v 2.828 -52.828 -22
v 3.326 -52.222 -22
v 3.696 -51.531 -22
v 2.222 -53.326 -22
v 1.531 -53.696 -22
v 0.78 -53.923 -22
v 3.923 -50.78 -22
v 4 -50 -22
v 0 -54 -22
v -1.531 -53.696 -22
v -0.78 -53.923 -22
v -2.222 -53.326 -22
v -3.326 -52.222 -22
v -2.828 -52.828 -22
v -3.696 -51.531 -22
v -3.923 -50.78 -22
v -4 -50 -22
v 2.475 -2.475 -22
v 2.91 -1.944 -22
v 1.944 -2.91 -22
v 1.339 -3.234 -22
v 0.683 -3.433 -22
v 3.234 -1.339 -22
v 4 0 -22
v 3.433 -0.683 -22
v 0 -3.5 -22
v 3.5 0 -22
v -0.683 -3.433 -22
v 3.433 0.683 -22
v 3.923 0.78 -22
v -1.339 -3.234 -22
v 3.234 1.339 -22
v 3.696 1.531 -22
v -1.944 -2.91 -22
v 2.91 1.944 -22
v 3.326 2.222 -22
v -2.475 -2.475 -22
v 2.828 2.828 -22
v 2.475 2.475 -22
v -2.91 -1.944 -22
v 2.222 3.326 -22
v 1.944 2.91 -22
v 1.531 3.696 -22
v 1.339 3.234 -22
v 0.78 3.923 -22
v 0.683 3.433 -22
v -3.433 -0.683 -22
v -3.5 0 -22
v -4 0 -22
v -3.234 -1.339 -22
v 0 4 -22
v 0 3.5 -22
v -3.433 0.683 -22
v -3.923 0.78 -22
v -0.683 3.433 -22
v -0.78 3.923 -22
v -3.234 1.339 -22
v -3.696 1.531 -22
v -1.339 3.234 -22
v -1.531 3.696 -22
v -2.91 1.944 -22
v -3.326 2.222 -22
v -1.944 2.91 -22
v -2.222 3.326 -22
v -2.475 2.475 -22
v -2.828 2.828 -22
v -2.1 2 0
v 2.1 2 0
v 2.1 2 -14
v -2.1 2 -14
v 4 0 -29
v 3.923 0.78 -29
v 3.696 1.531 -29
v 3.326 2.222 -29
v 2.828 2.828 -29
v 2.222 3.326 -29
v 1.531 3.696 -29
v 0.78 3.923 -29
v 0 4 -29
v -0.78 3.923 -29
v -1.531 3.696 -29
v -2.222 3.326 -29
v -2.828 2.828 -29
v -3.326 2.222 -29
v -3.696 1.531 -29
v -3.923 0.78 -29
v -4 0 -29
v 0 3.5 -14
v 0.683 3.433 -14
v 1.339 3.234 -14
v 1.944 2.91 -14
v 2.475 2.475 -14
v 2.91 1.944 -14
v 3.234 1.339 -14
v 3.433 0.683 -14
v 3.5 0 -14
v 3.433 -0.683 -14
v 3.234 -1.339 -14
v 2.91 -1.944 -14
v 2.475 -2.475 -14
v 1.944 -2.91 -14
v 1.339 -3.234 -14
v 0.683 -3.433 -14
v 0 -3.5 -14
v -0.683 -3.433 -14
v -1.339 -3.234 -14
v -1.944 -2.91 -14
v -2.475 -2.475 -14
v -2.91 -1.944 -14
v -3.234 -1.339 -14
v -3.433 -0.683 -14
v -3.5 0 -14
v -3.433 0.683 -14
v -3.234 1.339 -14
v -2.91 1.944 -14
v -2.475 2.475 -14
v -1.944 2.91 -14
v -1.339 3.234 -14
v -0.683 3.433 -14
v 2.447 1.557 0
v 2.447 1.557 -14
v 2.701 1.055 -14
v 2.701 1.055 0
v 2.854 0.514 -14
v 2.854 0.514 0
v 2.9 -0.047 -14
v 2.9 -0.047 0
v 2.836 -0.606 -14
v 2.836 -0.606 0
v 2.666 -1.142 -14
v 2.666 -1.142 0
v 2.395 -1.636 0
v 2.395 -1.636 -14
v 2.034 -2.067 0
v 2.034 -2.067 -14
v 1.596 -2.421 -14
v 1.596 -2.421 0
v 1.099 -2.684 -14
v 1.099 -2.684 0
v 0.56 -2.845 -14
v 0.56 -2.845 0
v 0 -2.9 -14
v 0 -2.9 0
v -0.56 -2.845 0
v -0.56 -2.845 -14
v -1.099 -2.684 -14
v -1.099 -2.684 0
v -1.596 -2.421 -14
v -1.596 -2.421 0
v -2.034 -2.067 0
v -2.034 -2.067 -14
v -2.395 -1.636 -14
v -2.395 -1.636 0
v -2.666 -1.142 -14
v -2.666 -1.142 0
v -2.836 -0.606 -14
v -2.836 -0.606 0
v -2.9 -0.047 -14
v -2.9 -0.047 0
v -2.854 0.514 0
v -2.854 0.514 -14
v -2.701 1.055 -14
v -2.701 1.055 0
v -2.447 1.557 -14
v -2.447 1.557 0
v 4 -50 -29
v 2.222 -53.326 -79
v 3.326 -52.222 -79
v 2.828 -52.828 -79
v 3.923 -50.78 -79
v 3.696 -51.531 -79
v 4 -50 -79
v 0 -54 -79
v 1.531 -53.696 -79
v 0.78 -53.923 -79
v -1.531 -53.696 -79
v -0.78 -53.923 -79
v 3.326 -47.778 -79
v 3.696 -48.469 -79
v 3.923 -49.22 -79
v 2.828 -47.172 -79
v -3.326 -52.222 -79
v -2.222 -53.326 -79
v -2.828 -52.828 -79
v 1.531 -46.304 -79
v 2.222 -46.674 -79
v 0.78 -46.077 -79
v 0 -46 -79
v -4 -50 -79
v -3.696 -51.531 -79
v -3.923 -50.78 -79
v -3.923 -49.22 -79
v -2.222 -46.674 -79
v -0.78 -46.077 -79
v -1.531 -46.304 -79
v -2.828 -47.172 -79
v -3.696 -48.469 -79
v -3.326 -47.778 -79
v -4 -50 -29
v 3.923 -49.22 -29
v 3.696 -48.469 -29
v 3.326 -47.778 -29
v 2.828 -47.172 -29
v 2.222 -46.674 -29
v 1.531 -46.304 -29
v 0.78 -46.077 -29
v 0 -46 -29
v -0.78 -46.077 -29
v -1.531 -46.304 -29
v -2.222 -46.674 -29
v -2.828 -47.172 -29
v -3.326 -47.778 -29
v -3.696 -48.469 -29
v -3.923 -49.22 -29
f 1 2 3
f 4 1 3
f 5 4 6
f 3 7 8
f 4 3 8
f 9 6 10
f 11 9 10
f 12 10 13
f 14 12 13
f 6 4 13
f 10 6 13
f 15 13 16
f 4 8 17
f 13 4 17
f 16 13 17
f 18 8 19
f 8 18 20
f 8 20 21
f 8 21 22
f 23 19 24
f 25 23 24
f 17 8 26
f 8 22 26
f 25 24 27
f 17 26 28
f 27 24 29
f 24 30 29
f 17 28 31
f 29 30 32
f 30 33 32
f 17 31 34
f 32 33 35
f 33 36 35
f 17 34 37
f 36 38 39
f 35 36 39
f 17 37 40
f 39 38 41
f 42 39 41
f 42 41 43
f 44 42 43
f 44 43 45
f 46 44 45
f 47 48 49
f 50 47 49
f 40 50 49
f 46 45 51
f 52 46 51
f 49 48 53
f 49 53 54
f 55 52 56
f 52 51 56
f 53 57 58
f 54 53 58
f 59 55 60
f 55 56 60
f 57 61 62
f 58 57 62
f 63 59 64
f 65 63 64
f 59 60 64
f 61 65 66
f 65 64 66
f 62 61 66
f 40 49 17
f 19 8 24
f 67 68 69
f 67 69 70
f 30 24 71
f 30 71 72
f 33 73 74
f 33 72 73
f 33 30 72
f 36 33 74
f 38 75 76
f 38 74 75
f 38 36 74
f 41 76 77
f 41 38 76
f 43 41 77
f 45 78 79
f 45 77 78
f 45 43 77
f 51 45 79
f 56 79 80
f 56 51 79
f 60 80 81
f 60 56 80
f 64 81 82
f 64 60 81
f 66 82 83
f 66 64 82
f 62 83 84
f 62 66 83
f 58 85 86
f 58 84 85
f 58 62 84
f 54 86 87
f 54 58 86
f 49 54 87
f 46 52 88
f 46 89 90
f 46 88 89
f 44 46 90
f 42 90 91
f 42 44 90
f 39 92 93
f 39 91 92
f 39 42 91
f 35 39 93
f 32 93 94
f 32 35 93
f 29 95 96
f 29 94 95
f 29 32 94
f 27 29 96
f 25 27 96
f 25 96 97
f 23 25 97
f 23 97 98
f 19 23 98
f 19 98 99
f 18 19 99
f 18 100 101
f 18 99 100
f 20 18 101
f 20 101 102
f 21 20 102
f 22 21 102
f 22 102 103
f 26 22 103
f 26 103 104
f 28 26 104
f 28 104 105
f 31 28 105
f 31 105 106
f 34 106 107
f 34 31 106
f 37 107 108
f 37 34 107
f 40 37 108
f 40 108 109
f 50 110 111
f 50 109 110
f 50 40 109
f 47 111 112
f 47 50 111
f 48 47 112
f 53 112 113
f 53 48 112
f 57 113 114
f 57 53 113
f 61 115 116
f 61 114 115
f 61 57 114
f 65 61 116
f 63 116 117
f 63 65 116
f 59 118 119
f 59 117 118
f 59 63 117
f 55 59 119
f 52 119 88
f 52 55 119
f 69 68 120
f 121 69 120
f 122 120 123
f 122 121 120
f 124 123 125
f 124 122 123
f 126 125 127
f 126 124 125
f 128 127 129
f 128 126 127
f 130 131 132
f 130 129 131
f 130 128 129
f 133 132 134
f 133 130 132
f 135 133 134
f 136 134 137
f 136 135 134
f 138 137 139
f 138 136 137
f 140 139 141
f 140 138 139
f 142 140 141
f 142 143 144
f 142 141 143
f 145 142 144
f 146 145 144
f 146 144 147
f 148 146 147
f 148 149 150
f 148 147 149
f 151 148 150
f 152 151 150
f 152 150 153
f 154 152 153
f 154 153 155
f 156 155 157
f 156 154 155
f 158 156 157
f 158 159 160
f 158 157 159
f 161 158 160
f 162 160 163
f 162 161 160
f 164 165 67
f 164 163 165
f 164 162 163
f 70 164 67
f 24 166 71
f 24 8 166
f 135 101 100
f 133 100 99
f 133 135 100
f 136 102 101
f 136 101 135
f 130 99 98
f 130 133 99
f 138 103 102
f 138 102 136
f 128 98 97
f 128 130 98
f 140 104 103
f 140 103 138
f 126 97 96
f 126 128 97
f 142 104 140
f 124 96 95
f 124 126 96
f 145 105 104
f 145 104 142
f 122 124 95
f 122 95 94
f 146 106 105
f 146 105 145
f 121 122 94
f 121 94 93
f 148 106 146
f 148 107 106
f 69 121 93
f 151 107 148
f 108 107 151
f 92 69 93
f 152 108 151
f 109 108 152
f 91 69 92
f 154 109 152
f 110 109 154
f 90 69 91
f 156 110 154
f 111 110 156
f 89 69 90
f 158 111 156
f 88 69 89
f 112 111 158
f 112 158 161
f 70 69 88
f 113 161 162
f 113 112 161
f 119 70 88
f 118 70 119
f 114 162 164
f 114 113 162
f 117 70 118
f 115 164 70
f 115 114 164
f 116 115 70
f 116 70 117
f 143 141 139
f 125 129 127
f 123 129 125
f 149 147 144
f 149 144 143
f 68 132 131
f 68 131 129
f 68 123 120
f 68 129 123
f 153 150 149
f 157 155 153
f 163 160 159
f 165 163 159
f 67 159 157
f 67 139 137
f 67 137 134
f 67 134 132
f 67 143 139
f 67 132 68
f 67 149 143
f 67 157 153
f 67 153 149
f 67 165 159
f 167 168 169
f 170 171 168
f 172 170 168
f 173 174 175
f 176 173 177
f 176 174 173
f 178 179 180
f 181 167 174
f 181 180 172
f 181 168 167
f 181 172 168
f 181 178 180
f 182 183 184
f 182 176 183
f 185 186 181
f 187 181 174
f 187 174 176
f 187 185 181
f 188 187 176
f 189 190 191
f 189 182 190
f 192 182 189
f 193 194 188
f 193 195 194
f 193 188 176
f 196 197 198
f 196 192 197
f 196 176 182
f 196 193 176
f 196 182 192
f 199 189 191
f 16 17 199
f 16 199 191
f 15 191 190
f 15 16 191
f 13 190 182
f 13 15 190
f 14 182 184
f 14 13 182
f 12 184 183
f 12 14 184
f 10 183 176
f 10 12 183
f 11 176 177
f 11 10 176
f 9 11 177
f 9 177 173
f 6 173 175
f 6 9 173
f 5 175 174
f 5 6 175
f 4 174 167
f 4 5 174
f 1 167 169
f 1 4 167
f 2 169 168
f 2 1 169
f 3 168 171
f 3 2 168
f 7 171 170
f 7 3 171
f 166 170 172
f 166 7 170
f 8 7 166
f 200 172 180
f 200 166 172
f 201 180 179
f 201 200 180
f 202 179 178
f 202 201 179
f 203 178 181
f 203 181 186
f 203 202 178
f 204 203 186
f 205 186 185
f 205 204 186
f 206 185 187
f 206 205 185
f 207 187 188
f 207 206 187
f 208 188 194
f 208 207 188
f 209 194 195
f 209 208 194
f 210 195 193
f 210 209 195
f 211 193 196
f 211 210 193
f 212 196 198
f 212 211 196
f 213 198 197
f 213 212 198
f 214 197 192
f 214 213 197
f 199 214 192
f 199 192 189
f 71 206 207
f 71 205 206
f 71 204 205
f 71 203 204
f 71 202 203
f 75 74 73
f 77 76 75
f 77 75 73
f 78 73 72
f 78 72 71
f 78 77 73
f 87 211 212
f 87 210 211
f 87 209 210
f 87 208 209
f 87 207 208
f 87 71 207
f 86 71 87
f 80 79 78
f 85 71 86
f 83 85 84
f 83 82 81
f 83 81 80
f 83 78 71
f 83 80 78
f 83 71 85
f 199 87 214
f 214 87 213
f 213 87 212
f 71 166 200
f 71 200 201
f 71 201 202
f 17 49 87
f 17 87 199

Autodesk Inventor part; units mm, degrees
ref_plane "YZ Plane" through (0, 0, 0) normal (1, 0, 0) x (0, 1, 0)
ref_plane "XZ Plane" through (0, 0, 0) normal (0, 1, 0) x (-1, 0, 0)
ref_plane "XY Plane" through (0, 0, 0) normal (0, 0, 1) x (1, 0, 0)
sketch "Sketch1" plane through (0, 0, 0) normal (1, 0, 0) x (0, 1, 0)
  line L0 (0, 0) -> (2.9, 0)
  line L1 (2.9, 0) -> (2.9, -14)
  line L2 (0, -14) -> (0, 0)
  line L3 (2.9, -14) -> (3.5, -14)
  line L4 (3.5, -14) -> (3.5, -22)
  line L5 (3.5, -22) -> (0, -22)
  line L6 (0, -22) -> (0, -14)
  dimension "d0" = 14
  dimension "d1" = 3.5
  dimension "d2" = 8
  dimension "d3" = 2.9
revolve "Revolution1" add sketch "Sketch1" angle 360 about axis through (0, 0, -22) along (0, 0, 1)
sketch "Sketch2" plane through (0, 0, -22) normal (0, 0, -1) x (-1, 0, 0)
  circle A0 centre (0, 0) radius 4
  line L0 (-4, 0) -> (4, 0)
  line L1 (4, 0) -> (4, -50)
  line L2 (4, -50) -> (-4, -50)
  line L3 (-4, -50) -> (-4, 0)
  circle A1 centre (0, -50) radius 4
  point P0 (4, 0)
  dimension "d5" = 8
  dimension "d6" = 50
extrude "Extrusion1" add sketch "Sketch2" along normal blind 7
sketch "Sketch3" plane through (0, 0, -29) normal (0, 0, -1) x (-1, 0, 0)
  arc A0 (-4, -50) -> (4, -50) centre (0, -50) ccw projected
  circle A1 centre (0, -50) radius 4
  point P0 (0, 0)
  point P1 (4, -50)
  point P2 (-4, -50)
extrude "Extrusion2" add sketch "Sketch3" along normal blind 50
sketch "Sketch4" plane through (0, 0, 0) normal (0, 0, 1) x (1, 0, 0)
  line L0 (2.1, 2) -> (-2.1, 2)
  arc A0 (2.1, 2) -> (-2.1, 2) centre (0, 0) ccw
  dimension "d11" = 2
extrude "Extrusion3" cut sketch "Sketch4" against normal up to surface (14 mm away)
properties part number "HandCrank"
